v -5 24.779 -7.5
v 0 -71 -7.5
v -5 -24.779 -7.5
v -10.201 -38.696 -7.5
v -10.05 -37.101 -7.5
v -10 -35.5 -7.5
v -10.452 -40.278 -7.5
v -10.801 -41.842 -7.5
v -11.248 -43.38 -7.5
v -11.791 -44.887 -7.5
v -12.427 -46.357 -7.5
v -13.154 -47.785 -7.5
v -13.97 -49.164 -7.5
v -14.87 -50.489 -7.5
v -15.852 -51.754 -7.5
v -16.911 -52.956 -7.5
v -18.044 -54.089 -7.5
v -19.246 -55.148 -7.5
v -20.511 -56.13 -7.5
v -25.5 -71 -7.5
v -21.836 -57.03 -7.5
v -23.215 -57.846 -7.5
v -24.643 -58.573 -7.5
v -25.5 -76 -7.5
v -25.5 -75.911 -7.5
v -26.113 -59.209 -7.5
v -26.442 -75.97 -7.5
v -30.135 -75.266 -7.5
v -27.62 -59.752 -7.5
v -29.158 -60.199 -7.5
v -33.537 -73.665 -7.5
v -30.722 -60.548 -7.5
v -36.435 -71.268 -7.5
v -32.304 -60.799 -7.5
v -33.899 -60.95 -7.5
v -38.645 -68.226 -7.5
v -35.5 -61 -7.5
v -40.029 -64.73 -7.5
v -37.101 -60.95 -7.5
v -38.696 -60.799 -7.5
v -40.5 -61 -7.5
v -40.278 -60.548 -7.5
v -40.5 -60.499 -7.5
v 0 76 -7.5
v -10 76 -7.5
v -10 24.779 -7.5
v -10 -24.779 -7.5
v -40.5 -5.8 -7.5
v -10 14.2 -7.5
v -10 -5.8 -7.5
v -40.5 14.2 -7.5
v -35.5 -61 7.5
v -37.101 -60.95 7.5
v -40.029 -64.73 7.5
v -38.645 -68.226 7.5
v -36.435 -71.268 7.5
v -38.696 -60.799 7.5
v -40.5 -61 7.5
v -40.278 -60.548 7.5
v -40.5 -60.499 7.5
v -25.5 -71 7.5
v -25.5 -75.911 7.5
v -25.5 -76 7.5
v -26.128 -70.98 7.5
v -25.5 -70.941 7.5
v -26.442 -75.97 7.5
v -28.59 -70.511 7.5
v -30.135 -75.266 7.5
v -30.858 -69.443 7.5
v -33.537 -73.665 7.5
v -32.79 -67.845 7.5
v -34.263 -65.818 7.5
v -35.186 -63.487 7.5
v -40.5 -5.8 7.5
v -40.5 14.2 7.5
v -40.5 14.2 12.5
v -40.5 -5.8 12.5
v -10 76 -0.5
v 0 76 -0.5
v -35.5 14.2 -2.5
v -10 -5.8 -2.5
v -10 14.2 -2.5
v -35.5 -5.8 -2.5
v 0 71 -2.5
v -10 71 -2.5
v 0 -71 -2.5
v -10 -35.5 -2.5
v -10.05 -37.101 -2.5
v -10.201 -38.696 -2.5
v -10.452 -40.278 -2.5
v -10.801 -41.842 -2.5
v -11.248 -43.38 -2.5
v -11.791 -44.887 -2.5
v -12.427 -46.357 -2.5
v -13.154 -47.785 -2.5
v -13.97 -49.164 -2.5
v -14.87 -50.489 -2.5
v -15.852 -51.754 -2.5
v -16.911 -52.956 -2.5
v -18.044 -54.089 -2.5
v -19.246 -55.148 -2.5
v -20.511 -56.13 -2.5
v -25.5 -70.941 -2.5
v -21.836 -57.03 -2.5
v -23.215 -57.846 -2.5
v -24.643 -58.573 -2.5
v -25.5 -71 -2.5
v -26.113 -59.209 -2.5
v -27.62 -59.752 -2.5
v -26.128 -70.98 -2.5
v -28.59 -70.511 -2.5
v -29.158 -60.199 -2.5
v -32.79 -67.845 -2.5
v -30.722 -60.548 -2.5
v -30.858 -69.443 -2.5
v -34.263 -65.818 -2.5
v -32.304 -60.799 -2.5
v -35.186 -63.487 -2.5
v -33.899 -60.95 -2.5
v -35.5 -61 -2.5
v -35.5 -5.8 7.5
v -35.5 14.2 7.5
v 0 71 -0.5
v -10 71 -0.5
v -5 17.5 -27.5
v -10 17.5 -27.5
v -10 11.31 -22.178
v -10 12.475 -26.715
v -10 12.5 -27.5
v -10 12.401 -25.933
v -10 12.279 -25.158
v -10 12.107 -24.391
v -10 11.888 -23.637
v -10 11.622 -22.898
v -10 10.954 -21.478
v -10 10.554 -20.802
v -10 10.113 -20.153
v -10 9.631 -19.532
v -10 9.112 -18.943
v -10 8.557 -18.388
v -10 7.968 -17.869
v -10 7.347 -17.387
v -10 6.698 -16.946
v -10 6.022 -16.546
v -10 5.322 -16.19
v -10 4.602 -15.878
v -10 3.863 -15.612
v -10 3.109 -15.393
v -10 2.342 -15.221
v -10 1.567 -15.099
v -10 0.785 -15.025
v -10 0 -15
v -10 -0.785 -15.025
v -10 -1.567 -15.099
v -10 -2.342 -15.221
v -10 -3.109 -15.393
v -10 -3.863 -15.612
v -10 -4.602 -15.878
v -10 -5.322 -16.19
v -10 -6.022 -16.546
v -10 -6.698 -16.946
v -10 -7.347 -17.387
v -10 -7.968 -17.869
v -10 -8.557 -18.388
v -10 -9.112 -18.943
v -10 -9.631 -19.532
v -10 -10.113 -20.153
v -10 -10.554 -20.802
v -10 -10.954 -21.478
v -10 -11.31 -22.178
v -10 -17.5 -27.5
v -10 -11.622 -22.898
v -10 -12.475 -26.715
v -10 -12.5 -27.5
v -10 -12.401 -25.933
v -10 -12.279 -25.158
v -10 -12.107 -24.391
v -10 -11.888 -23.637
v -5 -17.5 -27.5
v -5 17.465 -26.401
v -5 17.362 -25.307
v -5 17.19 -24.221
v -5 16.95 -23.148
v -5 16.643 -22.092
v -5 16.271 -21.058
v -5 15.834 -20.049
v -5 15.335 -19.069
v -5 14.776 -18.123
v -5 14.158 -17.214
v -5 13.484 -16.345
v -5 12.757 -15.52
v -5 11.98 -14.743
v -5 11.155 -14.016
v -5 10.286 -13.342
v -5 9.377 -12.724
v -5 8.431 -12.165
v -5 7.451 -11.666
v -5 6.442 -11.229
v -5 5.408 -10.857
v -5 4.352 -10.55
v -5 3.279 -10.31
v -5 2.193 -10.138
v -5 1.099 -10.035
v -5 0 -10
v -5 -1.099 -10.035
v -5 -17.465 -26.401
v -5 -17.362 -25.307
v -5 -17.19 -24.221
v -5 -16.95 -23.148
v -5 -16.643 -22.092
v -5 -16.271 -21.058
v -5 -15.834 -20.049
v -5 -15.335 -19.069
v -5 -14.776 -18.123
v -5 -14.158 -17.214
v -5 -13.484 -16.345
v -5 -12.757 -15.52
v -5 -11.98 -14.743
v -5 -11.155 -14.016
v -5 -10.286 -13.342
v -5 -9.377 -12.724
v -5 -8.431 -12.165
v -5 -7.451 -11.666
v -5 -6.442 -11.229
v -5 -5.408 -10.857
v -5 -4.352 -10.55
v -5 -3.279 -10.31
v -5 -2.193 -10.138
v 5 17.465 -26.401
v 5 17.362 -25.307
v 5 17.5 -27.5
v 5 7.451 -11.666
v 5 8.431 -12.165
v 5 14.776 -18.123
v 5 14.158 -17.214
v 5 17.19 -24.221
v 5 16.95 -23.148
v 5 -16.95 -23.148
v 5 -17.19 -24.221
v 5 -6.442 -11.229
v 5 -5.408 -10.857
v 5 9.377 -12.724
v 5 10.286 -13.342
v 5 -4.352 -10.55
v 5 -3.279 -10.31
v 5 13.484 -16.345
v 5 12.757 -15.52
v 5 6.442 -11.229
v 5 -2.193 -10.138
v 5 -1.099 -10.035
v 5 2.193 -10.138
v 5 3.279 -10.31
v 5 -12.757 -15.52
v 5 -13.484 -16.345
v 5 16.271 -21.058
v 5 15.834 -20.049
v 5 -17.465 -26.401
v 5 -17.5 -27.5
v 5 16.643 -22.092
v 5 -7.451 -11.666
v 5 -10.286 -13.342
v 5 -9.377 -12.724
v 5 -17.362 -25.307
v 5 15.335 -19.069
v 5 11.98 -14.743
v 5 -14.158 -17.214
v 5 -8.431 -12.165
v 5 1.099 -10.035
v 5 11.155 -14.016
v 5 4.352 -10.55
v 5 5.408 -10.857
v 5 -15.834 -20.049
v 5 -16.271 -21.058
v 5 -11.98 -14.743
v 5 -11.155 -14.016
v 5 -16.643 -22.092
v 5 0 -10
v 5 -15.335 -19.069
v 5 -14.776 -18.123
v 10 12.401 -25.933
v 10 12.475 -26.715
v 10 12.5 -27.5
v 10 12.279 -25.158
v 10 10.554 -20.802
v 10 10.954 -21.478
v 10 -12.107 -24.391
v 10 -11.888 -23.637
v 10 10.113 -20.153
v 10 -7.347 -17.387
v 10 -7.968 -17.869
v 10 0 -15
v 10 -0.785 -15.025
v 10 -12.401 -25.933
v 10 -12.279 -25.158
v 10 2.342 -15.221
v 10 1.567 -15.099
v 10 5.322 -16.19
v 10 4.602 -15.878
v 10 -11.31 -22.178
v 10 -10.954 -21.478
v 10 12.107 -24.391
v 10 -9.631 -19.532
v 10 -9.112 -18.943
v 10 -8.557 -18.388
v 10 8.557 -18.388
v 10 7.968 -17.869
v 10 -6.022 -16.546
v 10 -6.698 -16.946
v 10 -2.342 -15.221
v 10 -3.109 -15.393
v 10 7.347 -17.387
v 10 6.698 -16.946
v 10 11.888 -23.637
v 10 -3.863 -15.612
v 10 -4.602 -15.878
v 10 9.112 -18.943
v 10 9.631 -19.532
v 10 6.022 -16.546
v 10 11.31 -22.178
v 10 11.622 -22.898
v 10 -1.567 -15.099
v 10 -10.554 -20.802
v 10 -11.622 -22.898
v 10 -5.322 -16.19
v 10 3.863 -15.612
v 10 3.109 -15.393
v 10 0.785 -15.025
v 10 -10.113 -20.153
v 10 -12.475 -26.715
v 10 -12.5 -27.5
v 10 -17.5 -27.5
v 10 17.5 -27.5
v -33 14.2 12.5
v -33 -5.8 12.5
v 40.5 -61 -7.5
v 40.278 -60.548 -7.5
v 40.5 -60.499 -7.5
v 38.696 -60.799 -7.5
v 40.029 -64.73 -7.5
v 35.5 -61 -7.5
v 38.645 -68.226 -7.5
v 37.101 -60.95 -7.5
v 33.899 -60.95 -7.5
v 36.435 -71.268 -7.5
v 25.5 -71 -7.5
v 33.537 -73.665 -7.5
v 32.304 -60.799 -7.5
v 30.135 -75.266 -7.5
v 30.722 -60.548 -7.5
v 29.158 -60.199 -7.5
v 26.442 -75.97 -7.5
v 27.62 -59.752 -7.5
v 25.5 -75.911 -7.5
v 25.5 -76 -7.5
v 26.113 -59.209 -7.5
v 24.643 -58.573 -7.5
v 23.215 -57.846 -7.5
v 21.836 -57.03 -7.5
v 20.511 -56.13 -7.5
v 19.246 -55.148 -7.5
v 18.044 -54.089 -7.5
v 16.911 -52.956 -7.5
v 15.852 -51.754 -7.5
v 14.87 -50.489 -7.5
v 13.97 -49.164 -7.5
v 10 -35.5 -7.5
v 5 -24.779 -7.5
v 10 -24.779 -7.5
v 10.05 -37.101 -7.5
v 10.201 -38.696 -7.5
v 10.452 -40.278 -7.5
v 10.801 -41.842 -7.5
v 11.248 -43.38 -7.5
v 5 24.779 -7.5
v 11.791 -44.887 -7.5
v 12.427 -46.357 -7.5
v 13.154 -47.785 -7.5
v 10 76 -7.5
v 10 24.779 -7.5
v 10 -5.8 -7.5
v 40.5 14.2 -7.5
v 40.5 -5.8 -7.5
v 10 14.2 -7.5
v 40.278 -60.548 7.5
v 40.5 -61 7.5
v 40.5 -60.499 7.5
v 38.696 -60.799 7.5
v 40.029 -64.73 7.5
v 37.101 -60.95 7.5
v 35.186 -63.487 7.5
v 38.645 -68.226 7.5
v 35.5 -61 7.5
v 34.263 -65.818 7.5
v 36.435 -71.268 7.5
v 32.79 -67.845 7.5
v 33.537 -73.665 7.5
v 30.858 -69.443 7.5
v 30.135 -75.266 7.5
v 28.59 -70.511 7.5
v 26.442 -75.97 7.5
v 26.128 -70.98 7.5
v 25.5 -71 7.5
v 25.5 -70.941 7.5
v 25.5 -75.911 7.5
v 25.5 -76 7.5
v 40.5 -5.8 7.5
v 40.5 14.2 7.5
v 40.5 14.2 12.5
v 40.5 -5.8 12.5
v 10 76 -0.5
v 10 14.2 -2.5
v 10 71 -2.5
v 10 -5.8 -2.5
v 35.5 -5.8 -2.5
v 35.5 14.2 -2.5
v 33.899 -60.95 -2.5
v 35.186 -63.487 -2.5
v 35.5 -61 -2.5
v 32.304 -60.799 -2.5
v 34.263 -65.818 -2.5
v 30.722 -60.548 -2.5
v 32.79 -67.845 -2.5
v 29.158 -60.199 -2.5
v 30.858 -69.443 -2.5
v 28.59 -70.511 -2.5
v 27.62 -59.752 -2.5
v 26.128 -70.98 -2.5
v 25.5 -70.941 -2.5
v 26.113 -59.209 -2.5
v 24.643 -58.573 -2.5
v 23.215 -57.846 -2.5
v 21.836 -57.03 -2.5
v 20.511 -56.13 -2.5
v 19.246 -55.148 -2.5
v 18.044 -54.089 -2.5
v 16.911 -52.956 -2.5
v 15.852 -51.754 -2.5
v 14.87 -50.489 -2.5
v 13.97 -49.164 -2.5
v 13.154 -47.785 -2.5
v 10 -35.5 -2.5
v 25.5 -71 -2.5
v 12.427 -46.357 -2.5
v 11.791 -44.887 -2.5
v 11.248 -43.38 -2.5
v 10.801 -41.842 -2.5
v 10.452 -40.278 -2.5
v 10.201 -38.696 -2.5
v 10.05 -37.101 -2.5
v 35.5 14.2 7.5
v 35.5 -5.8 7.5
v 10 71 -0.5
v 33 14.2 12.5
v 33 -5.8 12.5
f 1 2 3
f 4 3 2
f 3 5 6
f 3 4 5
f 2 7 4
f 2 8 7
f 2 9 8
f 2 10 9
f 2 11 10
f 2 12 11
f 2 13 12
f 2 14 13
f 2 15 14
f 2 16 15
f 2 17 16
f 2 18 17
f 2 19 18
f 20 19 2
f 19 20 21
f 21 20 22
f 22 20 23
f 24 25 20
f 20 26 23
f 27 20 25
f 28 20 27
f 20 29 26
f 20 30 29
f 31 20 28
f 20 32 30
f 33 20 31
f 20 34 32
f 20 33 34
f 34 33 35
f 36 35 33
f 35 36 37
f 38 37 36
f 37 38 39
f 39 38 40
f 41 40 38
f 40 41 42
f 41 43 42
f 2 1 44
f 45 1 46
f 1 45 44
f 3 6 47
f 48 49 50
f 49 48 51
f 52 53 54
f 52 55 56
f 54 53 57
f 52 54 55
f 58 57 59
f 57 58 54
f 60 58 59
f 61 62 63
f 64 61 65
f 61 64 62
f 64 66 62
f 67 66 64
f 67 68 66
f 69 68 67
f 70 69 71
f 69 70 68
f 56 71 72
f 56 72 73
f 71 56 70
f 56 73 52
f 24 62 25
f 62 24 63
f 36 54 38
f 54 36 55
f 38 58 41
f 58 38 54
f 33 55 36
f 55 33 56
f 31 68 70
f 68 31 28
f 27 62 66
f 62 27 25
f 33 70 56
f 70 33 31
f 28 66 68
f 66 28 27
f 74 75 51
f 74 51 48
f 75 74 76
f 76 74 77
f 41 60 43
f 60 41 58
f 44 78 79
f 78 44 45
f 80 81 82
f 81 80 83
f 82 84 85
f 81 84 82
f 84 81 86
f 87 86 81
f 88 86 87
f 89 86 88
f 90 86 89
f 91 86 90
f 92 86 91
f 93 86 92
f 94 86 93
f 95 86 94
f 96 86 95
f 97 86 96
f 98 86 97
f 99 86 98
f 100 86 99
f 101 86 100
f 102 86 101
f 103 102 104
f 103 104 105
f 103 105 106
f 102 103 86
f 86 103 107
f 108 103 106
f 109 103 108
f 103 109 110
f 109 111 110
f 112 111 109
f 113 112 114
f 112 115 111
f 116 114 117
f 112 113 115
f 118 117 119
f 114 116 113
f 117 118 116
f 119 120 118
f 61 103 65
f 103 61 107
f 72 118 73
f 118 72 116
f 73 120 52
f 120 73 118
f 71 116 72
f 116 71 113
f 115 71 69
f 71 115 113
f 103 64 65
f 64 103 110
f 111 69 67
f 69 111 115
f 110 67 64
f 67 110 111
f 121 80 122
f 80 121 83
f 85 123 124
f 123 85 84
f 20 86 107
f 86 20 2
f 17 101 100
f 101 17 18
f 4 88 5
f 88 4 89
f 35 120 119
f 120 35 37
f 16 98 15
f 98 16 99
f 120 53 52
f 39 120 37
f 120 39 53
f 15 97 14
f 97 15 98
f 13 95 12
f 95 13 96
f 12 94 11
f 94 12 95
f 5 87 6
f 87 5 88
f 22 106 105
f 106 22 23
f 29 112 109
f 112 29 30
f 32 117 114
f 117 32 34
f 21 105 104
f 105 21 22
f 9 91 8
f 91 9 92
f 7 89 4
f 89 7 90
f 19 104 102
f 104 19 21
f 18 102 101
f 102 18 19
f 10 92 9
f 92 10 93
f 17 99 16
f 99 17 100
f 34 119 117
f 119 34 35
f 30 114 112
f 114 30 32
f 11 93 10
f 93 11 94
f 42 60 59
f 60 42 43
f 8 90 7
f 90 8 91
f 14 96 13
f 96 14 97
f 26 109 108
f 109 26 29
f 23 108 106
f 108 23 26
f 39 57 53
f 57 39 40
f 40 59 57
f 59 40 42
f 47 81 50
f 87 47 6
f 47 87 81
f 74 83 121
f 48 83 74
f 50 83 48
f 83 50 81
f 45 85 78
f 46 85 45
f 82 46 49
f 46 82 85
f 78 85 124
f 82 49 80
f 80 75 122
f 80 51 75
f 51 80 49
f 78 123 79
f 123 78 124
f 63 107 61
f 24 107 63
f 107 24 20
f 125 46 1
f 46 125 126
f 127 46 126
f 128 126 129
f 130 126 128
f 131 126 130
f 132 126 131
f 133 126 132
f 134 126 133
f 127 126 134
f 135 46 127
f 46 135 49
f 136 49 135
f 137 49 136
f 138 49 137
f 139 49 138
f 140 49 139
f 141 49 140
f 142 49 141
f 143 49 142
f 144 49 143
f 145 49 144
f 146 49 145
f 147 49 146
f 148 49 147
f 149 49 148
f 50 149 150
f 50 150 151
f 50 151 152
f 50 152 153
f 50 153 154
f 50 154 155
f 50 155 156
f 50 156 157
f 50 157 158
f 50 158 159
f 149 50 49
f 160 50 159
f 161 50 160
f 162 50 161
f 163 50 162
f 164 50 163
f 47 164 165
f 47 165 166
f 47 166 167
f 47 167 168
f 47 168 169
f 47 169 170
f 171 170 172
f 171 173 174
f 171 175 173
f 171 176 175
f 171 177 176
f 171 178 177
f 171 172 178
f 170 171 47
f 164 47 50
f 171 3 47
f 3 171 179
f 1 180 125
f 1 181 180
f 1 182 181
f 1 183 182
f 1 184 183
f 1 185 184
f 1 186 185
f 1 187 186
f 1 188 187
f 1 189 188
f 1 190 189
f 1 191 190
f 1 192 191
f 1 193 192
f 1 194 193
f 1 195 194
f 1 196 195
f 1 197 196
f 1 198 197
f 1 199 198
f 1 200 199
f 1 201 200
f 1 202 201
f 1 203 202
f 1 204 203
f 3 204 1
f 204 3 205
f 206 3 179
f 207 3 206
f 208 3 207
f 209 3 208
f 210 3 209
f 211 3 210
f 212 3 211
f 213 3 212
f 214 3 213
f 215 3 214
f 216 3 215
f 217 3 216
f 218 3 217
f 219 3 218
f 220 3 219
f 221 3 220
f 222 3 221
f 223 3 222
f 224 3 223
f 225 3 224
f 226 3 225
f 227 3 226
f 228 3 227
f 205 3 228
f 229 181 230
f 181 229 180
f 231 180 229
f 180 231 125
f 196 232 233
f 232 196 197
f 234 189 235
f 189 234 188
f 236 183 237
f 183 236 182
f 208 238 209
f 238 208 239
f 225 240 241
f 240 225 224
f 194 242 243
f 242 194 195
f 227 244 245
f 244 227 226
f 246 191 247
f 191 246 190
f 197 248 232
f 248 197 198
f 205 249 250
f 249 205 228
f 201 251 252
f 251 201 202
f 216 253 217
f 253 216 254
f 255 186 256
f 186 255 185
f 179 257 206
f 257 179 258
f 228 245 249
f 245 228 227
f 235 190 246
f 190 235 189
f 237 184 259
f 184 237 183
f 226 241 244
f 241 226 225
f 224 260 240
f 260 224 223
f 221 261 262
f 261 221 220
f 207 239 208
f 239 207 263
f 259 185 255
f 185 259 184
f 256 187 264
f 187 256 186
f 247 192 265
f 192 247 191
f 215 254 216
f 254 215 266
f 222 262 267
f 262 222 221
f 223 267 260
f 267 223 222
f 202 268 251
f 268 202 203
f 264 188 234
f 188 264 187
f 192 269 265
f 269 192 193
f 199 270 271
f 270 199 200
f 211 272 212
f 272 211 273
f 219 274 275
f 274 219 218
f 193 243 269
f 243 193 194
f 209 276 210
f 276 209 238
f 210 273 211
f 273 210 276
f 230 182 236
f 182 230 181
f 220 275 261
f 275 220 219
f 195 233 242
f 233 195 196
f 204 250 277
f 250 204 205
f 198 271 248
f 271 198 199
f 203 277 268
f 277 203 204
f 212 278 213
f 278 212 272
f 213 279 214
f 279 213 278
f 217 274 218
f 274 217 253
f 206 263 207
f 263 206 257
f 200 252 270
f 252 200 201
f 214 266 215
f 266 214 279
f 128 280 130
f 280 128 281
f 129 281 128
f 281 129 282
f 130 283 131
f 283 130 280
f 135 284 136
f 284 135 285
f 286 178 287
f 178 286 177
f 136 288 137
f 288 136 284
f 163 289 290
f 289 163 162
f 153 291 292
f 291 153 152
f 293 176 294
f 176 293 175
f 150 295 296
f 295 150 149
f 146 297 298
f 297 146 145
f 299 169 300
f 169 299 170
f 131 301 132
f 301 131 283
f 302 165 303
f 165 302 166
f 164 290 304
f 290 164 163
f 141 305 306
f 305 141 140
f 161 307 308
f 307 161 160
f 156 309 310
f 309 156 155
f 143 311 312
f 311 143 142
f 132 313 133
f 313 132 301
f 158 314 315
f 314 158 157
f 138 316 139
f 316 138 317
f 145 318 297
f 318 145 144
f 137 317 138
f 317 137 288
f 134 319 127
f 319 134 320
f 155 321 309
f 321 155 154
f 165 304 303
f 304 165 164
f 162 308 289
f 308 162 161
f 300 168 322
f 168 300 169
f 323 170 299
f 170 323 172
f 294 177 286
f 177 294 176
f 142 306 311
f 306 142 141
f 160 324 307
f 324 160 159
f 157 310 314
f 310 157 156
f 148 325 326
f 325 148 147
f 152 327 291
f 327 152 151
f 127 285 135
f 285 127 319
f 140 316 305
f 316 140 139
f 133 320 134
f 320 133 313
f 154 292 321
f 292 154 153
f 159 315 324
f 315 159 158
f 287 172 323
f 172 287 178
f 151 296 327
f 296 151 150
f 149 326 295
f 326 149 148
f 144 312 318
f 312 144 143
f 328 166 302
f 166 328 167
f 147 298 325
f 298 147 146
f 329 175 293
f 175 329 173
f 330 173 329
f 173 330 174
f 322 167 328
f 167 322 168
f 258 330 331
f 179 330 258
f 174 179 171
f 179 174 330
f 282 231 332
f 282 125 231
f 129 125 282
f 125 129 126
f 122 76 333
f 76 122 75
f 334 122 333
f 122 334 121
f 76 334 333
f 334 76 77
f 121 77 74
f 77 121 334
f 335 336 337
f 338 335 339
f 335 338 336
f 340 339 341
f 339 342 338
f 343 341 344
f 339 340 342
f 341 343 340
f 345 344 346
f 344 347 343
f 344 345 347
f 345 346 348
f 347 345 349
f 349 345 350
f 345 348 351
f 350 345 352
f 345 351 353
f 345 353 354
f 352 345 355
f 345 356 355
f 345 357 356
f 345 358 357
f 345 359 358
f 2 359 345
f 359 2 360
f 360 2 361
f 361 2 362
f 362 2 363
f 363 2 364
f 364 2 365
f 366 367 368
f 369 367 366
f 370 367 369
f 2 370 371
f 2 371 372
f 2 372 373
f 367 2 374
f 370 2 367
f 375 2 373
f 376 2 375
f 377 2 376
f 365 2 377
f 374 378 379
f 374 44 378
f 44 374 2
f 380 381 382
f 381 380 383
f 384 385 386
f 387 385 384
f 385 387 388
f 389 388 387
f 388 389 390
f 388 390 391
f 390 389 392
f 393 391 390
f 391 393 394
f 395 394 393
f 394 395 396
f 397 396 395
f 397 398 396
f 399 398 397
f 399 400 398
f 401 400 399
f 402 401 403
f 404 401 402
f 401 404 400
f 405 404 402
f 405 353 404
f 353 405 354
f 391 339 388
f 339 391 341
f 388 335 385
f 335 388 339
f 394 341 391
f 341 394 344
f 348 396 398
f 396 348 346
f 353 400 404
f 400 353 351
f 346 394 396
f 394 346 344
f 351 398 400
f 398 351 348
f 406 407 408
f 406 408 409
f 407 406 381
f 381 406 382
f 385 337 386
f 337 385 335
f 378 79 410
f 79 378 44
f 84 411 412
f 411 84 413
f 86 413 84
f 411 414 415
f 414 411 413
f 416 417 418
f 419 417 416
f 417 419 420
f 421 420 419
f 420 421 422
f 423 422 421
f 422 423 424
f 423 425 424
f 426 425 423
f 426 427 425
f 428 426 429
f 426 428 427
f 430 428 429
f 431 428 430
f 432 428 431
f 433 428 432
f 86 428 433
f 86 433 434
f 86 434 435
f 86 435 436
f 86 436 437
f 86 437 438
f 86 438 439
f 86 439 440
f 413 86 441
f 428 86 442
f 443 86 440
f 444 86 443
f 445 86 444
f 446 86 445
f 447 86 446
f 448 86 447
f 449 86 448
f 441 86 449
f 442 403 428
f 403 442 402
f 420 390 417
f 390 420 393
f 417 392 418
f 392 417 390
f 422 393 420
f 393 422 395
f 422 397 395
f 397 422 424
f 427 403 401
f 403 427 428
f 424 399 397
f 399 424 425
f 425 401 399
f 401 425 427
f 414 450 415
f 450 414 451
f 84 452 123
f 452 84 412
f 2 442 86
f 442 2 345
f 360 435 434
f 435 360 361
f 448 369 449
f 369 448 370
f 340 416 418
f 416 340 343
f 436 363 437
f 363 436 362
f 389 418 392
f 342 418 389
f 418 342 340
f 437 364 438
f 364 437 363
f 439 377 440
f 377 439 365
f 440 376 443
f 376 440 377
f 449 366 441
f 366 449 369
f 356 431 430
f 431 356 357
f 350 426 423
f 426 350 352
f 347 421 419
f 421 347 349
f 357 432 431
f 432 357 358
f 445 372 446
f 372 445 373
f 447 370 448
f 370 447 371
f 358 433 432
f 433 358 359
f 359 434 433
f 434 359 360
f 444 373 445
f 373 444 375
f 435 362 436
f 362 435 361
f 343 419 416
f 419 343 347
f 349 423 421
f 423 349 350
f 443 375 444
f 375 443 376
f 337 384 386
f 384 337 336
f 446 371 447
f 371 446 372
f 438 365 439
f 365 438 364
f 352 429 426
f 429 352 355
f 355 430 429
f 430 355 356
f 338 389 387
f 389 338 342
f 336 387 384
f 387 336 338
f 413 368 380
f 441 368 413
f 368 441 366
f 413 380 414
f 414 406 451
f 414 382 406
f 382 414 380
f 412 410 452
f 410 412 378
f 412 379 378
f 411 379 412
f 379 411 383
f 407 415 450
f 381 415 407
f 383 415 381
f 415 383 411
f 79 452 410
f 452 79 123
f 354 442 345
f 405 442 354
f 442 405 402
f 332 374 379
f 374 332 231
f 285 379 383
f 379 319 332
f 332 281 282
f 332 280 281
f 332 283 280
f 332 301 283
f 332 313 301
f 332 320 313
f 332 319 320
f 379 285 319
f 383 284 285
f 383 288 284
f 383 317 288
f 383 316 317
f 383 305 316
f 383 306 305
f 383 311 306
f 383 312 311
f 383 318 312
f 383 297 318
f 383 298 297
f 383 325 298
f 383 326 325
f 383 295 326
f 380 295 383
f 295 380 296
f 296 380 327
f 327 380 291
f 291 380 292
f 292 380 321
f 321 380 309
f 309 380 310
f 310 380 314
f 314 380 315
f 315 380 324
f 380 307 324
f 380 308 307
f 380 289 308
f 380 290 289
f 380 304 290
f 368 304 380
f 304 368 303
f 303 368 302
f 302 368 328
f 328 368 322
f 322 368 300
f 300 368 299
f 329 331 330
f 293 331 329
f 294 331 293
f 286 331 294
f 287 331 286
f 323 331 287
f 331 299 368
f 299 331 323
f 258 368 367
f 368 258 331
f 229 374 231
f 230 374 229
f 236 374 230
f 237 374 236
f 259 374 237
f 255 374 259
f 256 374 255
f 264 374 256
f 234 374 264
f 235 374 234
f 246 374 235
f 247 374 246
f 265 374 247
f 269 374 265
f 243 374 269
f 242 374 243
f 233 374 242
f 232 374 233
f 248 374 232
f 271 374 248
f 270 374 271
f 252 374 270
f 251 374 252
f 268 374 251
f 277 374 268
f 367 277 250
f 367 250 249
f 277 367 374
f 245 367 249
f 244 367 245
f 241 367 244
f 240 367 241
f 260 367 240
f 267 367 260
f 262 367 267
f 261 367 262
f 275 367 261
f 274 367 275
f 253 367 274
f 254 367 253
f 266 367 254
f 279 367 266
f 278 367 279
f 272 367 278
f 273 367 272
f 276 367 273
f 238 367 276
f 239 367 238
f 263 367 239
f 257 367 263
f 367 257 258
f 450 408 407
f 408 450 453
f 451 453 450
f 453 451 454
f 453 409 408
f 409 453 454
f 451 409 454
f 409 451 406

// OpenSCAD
// mm 
phoneWidth = 71;

// mm 
phoneLength = 142;

// mm
phoneHeight = 10;

// mm 
phoneCornerRad = 10;

// mm
handlebarDiameter = 25;

// Measured from feet to bottom of holder (mm)
bridgeHeight = 20;



leftHalf();
mirror([1,0,0]) leftHalf();
module leftHalf()
{

rimWidth = 5;
barWidth = 20;
barTop = .6;  // fraction of length for y position of top of bar

$fn=100;
handlebarRad = handlebarDiameter/2;
cutoutRad = (phoneWidth-barWidth)/2;

y1 = handlebarRad+rimWidth;
y2 = y1+bridgeHeight*tan(20);


crossBarTop = barTop*phoneLength-phoneLength/2;
crossBarBottom = crossBarTop-barWidth;
cutoutLength = phoneLength/2 - phoneCornerRad - cutoutRad + crossBarBottom;



difference()
{
// outer box
roundedRect(phoneWidth+2*rimWidth,phoneLength+2*rimWidth,phoneHeight+rimWidth,phoneCornerRad+rimWidth);

//inner box
translate([0,0,rimWidth/2])
roundedRect(phoneWidth,phoneLength,phoneHeight,phoneCornerRad);
// left coutout
translate([-phoneWidth/2,-(phoneLength/2-cutoutRad-phoneCornerRad),-(phoneHeight+rimWidth)/2])
difference()
{
    cylinder(r=cutoutRad,h=rimWidth+phoneHeight);
    translate([-cutoutRad,0,0])
    cube([2*cutoutRad,cutoutRad,rimWidth+phoneHeight]);
}
translate([-phoneWidth/2-rimWidth,crossBarBottom-cutoutLength,-phoneHeight])
cube([cutoutRad+rimWidth,cutoutLength,2*phoneHeight]);

// Cutout entire right half
translate([-phoneWidth-barWidth/2,-phoneLength/2+barTop*phoneLength,-phoneHeight])
cube([phoneWidth,phoneLength,2*phoneHeight]);
translate([phoneWidth/2,0,0])cube([phoneWidth,phoneLength*2,phoneHeight*2],center=true);
// Cut front to just over bar height
translate([0,phoneLength/2,rimWidth/2+2])cube([phoneWidth/2,2*rimWidth,phoneHeight],center=true);
// Cut back
translate([0,-rimWidth/2-phoneLength/2,0])
    cube([phoneWidth-2*phoneCornerRad,rimWidth,2*phoneHeight],center=true);
}

// Gripper
translate([-phoneWidth/2-rimWidth,crossBarBottom+barWidth,(phoneHeight+rimWidth)/2])
rotate([90,0,0])
linear_extrude(height=barWidth)
polygon([[0,0],[rimWidth,0],[3*rimWidth/2,rimWidth],[0,rimWidth]],convexity=1);


translate([-barWidth/2,0,-bridgeHeight-(rimWidth+phoneHeight)/2])
rotate([90,0,90])
difference()
{
    union()
    {
        linear_extrude(height=rimWidth)
        polygon([[-y1,0],[y1,0],[y2,bridgeHeight],[-y2,bridgeHeight]],1);
        cylinder(r=handlebarRad+rimWidth,h=barWidth/2);
    }
    cylinder(r=handlebarRad,h=barWidth/2);
    translate([-y1,-handlebarRad-rimWidth,0])cube([2*y1,handlebarRad+rimWidth,20]);
}
}


// This module creates the shape that needs to be subtracted from a cube to make its corners rounded.

module createMeniscus(height, radius){

rrhide = 0.001;

//This shape is basicly the difference between a quarter of cylinder and a cube

difference(){

translate([radius/2 + rrhide, radius/2 + rrhide]){

cube([radius + rrhide, radius + rrhide, height + rrhide], center=true); 

}

cylinder(h = height, r = radius, $fn = 25, center=true);

}

}

// Now we just substract the shape we have created in the four corners

module roundedRect(xu, yu, zu, ru) { 

rotation = 0;

difference(){

cube([xu, yu, zu], center=true);

translate([xu/2-ru, yu/2-ru]){

rotate(0){ 

createMeniscus(zu, ru); 

}

}



translate([-xu/2+ru, yu/2-ru]){

rotate(90){

createMeniscus(zu, ru);

}

}

translate([-xu/2+ru, -yu/2+ru]){

rotate(180){

createMeniscus(zu, ru);

}

}



translate([xu/2-ru, -yu/2+ru]){

rotate(270){

createMeniscus(zu, ru);

}

}

}

}

module roundedRectX(x, y, z, r){

rotate([90,0,90]){

roundedRect(y, z, x, r);

}

}

module roundedRectY(x, y, z, r){

rotate([0,90,90]){

roundedRect(z, x, y, r);

}

}

module roundedRectZ(x, y, z, r){

roundedRect(x, y, z, r);

}
